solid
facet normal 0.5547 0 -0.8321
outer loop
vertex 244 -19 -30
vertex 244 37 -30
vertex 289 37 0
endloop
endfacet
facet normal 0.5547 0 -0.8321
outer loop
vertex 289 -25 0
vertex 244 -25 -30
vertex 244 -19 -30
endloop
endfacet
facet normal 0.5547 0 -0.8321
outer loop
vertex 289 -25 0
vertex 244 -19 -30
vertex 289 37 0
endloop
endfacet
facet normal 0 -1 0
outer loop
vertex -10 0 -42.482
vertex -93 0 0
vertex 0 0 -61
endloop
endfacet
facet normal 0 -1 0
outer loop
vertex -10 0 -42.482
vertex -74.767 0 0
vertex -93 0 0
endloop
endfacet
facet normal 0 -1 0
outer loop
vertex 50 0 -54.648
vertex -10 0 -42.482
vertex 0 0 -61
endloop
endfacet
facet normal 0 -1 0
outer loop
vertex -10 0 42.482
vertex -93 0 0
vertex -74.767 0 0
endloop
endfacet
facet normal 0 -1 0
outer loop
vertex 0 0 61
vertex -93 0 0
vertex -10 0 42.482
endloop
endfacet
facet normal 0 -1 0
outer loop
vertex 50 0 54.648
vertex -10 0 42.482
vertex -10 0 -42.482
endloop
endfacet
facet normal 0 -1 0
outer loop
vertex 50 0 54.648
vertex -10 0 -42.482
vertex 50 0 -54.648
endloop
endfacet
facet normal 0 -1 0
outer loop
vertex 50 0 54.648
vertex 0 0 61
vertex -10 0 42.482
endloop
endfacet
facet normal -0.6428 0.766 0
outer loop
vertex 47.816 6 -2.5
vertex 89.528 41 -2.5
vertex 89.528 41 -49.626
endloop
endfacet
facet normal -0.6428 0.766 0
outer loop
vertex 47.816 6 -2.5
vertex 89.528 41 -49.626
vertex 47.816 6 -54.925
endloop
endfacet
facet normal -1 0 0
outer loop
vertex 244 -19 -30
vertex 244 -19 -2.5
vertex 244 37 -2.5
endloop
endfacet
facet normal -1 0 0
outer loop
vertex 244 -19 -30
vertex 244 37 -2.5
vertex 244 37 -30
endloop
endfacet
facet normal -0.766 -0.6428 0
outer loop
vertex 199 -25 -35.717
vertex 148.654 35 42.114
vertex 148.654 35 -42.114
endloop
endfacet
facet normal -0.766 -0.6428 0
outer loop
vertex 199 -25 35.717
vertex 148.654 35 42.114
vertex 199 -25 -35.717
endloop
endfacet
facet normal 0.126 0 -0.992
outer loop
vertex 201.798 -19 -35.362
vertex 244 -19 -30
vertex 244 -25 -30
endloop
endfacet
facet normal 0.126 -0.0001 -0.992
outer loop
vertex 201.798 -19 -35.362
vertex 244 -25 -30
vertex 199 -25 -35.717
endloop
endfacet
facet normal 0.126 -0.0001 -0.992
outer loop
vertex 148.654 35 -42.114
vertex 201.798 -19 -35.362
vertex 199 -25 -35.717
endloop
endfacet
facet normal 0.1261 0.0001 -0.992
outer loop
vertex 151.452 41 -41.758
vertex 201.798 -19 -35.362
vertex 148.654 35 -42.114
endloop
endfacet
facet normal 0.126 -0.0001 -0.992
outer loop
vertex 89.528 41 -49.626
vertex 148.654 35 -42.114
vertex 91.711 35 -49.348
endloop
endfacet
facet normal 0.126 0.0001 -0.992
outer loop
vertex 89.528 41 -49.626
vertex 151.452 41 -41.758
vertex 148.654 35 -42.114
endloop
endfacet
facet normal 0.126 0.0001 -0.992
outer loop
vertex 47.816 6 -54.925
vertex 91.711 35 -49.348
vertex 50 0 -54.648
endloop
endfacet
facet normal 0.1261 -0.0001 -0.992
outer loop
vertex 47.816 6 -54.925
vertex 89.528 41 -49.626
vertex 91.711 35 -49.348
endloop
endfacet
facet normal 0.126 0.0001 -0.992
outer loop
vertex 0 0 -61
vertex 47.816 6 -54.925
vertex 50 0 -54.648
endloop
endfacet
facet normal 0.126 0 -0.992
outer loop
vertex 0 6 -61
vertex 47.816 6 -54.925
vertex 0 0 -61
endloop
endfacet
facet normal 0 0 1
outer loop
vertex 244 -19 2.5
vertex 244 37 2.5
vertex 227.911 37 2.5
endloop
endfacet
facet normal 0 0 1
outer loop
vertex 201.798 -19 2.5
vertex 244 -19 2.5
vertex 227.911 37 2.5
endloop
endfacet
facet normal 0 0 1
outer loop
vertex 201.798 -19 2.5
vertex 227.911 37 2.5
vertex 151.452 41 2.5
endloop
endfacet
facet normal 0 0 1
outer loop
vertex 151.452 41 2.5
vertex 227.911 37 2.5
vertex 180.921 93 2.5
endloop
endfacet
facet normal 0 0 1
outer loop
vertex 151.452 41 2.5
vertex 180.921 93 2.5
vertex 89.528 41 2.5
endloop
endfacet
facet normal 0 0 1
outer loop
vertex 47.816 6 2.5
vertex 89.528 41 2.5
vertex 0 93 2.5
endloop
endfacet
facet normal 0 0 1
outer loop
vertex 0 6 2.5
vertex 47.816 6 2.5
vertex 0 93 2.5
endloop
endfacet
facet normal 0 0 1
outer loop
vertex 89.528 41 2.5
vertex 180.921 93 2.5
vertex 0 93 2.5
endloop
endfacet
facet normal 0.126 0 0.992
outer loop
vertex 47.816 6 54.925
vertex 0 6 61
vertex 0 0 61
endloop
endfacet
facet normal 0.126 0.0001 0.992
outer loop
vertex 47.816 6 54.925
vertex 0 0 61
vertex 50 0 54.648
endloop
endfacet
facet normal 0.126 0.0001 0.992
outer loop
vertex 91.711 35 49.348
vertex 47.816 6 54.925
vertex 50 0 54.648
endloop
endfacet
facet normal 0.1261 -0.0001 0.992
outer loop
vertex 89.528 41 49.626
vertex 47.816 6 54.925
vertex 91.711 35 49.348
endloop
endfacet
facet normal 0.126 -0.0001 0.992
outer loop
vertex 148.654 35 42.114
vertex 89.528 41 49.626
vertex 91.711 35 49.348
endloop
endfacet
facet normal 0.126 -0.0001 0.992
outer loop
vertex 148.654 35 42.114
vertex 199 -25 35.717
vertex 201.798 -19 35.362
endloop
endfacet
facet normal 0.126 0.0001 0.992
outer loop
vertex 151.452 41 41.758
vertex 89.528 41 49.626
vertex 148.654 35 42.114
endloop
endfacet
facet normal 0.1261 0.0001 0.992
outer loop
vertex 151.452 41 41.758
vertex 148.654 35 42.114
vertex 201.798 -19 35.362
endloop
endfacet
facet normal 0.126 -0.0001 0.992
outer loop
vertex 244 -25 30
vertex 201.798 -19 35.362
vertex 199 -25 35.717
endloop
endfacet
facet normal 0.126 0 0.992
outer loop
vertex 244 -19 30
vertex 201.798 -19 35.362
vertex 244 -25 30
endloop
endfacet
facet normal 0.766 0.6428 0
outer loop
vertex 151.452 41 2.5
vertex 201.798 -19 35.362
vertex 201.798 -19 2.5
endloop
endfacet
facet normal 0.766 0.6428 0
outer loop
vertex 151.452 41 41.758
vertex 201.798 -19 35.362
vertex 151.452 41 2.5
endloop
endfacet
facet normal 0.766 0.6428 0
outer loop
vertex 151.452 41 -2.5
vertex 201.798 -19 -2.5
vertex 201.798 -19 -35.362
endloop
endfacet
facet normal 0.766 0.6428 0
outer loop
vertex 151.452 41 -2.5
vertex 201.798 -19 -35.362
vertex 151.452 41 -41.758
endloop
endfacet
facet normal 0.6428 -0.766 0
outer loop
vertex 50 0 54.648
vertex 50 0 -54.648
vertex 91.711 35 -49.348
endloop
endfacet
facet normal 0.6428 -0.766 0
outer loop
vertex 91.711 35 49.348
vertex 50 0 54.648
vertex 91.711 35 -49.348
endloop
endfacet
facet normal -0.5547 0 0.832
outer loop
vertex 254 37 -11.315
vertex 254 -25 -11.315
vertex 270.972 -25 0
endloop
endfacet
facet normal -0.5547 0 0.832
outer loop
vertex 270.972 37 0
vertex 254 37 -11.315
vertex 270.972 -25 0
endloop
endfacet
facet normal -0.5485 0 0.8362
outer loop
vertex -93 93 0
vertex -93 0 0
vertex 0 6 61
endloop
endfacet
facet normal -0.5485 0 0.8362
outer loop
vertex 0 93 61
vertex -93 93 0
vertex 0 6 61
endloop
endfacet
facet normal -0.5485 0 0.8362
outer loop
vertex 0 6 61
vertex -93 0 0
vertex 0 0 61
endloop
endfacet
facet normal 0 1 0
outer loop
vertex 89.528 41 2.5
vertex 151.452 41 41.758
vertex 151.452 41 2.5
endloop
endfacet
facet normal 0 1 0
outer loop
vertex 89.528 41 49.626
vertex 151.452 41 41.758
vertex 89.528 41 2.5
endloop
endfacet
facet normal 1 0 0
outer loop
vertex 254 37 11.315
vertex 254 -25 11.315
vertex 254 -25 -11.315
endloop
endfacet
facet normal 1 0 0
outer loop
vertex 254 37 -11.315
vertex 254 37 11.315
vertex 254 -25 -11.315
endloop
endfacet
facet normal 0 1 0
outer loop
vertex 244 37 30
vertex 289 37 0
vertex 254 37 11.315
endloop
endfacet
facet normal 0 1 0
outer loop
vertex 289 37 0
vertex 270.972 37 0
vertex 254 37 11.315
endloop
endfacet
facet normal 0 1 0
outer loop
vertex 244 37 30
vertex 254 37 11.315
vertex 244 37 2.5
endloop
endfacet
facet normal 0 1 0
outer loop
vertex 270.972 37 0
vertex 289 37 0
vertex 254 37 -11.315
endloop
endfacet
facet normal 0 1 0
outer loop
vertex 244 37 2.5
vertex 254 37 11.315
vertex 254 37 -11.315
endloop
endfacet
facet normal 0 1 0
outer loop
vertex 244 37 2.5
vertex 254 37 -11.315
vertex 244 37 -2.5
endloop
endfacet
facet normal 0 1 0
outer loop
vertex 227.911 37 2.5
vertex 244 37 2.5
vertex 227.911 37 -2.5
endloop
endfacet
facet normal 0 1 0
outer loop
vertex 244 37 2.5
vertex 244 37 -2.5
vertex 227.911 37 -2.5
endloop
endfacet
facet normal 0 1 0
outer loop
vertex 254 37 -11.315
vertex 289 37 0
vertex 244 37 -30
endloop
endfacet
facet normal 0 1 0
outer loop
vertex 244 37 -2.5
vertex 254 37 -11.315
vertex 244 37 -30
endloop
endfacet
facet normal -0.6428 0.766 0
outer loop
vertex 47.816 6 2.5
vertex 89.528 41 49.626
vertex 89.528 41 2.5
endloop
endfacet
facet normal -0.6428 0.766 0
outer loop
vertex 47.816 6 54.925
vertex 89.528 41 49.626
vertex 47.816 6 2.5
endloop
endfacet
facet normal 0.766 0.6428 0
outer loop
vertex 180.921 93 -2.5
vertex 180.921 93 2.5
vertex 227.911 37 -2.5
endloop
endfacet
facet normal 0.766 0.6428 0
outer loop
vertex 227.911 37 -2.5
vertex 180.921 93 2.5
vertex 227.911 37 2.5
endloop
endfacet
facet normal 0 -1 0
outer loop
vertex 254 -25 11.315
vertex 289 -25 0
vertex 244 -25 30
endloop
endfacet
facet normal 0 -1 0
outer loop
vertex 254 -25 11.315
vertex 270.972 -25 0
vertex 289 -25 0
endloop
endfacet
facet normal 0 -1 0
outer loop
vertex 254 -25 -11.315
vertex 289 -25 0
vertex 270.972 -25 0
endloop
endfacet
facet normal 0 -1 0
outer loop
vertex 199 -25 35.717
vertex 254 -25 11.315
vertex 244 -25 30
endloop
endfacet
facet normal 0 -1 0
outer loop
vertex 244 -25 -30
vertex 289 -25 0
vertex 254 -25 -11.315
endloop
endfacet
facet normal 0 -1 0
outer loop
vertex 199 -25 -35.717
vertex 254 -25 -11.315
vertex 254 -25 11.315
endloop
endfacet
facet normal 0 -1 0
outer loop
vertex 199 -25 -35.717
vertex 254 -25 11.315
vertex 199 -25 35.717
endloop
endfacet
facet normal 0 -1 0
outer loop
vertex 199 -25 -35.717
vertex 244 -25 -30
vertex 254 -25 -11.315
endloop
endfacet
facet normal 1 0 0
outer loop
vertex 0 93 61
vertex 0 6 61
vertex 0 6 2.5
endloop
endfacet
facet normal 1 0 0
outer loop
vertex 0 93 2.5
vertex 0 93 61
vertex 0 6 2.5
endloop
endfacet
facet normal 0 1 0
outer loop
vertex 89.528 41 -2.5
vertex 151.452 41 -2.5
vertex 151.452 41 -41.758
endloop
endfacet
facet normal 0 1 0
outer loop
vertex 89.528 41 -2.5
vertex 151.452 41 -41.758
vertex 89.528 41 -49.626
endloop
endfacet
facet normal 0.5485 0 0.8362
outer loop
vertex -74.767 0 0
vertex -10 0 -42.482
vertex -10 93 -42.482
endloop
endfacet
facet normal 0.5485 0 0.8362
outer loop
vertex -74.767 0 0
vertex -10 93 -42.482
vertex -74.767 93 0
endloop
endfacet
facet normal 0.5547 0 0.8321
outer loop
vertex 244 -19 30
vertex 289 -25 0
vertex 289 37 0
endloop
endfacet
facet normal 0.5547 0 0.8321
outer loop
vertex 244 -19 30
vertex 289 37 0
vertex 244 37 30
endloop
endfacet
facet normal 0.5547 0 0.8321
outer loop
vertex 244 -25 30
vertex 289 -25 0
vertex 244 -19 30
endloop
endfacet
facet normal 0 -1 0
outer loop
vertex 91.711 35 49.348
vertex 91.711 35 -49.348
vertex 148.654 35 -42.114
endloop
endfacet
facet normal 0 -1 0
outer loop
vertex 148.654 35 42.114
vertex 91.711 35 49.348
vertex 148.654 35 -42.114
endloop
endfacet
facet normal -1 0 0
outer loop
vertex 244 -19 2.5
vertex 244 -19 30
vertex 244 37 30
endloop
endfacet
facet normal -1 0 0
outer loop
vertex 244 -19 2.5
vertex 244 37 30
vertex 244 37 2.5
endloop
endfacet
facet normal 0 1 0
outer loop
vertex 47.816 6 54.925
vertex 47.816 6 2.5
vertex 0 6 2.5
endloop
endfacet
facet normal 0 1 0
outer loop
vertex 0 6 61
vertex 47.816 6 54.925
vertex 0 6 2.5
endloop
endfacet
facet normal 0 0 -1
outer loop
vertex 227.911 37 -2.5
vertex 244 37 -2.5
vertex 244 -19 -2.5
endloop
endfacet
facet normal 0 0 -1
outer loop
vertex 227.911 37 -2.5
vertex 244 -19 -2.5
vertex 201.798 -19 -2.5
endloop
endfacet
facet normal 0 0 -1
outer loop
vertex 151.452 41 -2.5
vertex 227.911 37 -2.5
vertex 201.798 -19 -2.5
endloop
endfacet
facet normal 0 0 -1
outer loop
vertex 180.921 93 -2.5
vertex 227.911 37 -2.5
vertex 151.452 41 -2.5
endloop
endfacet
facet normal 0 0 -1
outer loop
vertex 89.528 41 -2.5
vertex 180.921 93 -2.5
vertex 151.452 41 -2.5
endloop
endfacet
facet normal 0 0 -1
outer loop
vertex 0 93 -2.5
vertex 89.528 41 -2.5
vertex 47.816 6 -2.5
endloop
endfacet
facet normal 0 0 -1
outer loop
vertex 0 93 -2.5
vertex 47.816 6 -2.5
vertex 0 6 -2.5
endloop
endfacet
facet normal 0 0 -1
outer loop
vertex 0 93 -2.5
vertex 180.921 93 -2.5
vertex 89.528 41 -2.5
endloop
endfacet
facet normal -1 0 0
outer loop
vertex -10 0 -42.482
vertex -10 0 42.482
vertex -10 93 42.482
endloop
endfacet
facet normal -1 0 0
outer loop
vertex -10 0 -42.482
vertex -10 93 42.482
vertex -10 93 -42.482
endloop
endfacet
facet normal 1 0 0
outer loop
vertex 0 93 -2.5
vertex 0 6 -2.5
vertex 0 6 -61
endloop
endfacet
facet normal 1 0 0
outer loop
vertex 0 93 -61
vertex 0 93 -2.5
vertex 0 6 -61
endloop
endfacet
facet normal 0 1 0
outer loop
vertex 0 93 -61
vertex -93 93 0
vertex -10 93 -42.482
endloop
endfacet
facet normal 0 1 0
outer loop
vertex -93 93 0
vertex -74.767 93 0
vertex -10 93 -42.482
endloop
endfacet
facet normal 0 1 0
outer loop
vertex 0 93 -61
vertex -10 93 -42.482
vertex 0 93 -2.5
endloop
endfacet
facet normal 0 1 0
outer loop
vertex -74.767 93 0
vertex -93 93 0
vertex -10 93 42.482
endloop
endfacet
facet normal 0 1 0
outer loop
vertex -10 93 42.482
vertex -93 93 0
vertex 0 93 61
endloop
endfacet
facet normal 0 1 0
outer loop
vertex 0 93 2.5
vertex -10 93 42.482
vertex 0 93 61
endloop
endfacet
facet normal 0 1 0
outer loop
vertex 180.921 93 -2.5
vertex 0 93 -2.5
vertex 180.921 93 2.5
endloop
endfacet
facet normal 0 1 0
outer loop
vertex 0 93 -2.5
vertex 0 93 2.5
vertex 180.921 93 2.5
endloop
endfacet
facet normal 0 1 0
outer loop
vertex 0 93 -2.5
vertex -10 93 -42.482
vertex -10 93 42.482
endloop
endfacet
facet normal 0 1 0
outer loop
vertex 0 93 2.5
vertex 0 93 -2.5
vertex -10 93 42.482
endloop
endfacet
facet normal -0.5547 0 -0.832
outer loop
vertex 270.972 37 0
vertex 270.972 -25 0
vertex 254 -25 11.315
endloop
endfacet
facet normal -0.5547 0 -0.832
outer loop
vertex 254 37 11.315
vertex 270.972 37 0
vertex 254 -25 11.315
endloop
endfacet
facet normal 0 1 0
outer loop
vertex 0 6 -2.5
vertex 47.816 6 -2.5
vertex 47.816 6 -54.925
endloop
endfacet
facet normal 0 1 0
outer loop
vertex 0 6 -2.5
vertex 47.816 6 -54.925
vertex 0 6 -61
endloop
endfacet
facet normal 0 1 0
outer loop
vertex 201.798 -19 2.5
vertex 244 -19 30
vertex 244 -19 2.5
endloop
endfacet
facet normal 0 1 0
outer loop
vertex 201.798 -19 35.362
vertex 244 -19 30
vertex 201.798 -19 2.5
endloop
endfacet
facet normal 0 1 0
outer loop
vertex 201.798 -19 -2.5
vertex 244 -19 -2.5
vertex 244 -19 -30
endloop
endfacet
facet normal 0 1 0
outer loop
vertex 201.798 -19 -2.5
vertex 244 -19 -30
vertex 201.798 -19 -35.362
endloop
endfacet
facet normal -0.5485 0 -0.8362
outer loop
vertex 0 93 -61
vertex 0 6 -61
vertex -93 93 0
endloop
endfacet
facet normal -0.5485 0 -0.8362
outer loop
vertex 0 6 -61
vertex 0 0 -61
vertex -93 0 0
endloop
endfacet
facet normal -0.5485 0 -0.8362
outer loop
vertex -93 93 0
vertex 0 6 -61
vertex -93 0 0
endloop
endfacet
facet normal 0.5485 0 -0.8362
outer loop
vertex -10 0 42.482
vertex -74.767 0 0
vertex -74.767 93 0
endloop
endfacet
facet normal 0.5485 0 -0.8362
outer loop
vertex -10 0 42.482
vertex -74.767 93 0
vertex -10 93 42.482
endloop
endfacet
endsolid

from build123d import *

# Parameters (mm, degrees)
BOSS_EXTRUDE1_DEPTH     = 93
BOSS_EXTRUDE2_DEPTH     = 61
BOSS_EXTRUDE3_START     = -25
BOSS_EXTRUDE3_DEPTH     = 62
BOSS_EXTRUDE4_DEPTH     = 2.5
CUT_EXTRUDE2_DEPTH      = 94
CUT_EXTRUDE2_DEPTH_BACK = 26


with BuildPart() as part:
    # Sketch2 → Boss-Extrude1 (new body)
    with BuildSketch(Plane(origin=(0, 0, 0), x_dir=(1, 0, 0), z_dir=(0, 1, 0))):
        Polygon((0, -61), (0, 61), (-93, 0), align=None)
        Polygon((-10, 42.481666483), (-74.767130868, 0), (-10, -42.481666483), align=None, mode=Mode.SUBTRACT)
    extrude(amount=BOSS_EXTRUDE1_DEPTH)

    # Sketch3 → Boss-Extrude2 (add, symmetric)
    with BuildSketch(Plane.XY):
        Polygon((0, 0), (50, 0), (91.711375741, 35), (148.654022129, 35), (199, -25), (244, -25), (244, -19), (201.797845949, -19), (151.451868078, 41), (89.527554335, 41), (47.816178594, 6), (0, 6), align=None)
    extrude(amount=BOSS_EXTRUDE2_DEPTH, both=True)

    # Sketch4 → Boss-Extrude3 (add)
    with BuildSketch(Plane(origin=(0, 0, 0), x_dir=(1, 0, 0), z_dir=(0, 1, 0)).offset(BOSS_EXTRUDE3_START)):
        Polygon((244, -30), (244, 30), (289, 0), align=None)
        Polygon((254, 11.314829082), (270.972243623, 0), (254, -11.314829082), align=None, mode=Mode.SUBTRACT)
    extrude(amount=BOSS_EXTRUDE3_DEPTH)

    # Sketch7 → Boss-Extrude4 (add, symmetric)
    with BuildSketch(Plane.XY):
        Polygon((0, 93), (180.92149546, 93), (227.911074806, 37), (244, 37), (244, -19), (201.797845949, -19), (151.451868078, 41), (89.527554335, 41), (47.816178594, 6), (0, 6), align=None)
    extrude(amount=BOSS_EXTRUDE4_DEPTH, both=True)

    # Sketch8 → Cut-Extrude2 (cut, two sides)
    with BuildSketch(Plane(origin=(0, 0, 0), x_dir=(1, 0, 0), z_dir=(0, 1, 0))) as cut_extrude2_sk:
        Polygon((0, 61), (244, 61), (244, 30), align=None)
        Polygon((0, -61), (244, -30), (244, -61), align=None)
    extrude(amount=CUT_EXTRUDE2_DEPTH, mode=Mode.SUBTRACT)
    extrude(cut_extrude2_sk.sketch, amount=-CUT_EXTRUDE2_DEPTH_BACK, mode=Mode.SUBTRACT)


solid = part.part
